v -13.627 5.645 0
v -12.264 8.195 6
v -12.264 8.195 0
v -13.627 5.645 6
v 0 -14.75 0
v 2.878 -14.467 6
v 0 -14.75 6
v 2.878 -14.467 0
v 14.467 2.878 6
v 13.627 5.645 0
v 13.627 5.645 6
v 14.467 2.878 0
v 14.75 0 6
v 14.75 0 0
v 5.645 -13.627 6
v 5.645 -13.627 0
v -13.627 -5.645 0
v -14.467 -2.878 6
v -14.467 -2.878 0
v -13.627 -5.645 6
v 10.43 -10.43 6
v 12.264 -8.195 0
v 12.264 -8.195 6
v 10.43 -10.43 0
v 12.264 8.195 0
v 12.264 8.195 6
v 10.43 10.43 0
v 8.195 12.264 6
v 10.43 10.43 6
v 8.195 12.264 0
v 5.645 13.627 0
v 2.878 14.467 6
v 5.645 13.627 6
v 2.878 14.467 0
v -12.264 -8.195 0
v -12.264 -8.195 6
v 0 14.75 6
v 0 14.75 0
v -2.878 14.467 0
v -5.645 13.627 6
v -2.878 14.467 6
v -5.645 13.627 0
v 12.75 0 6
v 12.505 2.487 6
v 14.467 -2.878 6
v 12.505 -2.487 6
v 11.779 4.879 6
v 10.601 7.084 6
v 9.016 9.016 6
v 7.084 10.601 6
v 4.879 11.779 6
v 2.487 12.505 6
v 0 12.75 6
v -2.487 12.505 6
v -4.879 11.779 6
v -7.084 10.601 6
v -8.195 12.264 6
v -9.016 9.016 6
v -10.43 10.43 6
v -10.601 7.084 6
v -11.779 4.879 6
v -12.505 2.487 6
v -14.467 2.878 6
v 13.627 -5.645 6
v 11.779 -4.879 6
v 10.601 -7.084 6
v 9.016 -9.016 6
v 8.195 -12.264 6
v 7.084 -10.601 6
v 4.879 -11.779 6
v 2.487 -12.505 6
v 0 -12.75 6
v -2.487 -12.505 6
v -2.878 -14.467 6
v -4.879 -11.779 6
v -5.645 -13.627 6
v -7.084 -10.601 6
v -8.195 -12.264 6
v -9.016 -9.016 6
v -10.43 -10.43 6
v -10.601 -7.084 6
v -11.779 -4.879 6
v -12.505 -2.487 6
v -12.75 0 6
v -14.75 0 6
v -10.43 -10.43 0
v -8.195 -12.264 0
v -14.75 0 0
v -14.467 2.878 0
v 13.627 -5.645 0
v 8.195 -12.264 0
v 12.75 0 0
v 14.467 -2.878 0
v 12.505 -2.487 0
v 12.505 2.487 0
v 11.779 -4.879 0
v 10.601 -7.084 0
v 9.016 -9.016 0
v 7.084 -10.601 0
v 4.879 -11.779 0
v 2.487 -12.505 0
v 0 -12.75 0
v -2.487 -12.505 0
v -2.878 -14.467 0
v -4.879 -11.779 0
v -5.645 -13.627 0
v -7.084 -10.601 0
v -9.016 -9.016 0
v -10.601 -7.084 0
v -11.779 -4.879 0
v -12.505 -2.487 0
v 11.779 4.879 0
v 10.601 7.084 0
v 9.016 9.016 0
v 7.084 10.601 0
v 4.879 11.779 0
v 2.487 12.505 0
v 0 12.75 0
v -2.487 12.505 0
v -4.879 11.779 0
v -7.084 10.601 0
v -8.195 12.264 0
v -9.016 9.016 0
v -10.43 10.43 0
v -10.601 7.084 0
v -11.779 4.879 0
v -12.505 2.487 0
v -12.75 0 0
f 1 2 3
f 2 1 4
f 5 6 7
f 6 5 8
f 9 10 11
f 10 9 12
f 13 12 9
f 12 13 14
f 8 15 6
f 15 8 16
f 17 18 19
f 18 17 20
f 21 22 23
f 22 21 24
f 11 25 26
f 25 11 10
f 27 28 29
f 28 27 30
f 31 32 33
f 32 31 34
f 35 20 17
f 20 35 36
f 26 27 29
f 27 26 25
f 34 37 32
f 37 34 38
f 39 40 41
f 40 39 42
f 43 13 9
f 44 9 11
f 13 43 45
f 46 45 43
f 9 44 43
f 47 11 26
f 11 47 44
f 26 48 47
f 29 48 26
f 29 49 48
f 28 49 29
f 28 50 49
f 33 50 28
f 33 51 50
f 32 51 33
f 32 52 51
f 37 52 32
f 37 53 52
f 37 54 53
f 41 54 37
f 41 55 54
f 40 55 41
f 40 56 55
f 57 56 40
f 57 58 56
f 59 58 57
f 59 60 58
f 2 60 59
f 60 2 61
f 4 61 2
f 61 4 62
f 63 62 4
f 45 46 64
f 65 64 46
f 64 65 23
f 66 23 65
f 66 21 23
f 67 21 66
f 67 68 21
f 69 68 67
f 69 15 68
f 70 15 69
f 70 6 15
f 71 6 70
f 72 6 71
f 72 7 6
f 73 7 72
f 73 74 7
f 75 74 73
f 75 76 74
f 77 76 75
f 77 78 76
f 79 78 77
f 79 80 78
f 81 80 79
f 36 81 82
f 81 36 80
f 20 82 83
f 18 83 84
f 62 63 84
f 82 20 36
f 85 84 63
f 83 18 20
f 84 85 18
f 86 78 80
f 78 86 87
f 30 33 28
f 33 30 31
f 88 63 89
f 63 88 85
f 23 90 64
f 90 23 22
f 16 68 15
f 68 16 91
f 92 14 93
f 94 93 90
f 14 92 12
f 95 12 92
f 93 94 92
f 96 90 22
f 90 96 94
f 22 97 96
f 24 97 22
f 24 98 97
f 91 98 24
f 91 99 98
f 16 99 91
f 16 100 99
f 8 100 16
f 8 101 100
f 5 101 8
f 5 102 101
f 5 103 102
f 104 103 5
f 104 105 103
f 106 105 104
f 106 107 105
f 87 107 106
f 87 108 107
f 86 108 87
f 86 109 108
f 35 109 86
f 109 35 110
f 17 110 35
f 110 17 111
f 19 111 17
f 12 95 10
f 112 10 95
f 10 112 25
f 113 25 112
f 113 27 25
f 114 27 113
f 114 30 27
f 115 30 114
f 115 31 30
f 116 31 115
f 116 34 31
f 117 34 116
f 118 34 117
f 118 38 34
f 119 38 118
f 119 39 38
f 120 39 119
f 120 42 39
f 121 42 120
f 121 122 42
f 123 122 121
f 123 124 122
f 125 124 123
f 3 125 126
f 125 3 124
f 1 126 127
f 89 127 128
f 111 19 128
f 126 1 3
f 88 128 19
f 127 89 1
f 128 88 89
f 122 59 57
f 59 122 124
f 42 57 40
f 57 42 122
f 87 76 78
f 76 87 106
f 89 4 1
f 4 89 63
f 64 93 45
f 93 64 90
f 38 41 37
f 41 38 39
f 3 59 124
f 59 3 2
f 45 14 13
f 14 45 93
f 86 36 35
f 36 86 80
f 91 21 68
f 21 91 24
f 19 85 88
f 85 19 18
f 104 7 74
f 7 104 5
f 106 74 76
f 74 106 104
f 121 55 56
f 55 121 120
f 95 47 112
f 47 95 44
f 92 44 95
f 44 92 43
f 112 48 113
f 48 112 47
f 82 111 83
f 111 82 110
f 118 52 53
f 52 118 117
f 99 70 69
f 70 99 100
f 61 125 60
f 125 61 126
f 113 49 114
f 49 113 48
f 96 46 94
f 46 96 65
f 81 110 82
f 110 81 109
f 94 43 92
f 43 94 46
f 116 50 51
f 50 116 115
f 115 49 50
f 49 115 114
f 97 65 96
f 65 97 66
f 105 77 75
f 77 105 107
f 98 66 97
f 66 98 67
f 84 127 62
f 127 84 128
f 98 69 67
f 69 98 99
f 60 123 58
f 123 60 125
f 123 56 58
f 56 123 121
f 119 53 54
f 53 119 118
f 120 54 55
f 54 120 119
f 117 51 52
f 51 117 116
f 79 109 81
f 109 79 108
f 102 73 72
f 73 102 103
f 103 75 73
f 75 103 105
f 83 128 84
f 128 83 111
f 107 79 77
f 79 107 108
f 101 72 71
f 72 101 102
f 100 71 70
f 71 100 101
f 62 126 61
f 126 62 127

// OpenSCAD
$fn = 32;

// ----------------------------------------------------------------------
// Spacer sleeve: 29.5 / 25.5 x 6 mm
// ----------------------------------------------------------------------

// --- parameters (mm) ---
tube_d = 29.5;            // outside diameter
bore_d = 25.5;            // shaft bore
tube_l = 6;               // sleeve length

module sleeve() {
  cylinder(h = tube_l, d = tube_d);
}

difference() {
  sleeve();
  translate([0, 0, -1]) cylinder(h = tube_l + 2, d = bore_d);
}
